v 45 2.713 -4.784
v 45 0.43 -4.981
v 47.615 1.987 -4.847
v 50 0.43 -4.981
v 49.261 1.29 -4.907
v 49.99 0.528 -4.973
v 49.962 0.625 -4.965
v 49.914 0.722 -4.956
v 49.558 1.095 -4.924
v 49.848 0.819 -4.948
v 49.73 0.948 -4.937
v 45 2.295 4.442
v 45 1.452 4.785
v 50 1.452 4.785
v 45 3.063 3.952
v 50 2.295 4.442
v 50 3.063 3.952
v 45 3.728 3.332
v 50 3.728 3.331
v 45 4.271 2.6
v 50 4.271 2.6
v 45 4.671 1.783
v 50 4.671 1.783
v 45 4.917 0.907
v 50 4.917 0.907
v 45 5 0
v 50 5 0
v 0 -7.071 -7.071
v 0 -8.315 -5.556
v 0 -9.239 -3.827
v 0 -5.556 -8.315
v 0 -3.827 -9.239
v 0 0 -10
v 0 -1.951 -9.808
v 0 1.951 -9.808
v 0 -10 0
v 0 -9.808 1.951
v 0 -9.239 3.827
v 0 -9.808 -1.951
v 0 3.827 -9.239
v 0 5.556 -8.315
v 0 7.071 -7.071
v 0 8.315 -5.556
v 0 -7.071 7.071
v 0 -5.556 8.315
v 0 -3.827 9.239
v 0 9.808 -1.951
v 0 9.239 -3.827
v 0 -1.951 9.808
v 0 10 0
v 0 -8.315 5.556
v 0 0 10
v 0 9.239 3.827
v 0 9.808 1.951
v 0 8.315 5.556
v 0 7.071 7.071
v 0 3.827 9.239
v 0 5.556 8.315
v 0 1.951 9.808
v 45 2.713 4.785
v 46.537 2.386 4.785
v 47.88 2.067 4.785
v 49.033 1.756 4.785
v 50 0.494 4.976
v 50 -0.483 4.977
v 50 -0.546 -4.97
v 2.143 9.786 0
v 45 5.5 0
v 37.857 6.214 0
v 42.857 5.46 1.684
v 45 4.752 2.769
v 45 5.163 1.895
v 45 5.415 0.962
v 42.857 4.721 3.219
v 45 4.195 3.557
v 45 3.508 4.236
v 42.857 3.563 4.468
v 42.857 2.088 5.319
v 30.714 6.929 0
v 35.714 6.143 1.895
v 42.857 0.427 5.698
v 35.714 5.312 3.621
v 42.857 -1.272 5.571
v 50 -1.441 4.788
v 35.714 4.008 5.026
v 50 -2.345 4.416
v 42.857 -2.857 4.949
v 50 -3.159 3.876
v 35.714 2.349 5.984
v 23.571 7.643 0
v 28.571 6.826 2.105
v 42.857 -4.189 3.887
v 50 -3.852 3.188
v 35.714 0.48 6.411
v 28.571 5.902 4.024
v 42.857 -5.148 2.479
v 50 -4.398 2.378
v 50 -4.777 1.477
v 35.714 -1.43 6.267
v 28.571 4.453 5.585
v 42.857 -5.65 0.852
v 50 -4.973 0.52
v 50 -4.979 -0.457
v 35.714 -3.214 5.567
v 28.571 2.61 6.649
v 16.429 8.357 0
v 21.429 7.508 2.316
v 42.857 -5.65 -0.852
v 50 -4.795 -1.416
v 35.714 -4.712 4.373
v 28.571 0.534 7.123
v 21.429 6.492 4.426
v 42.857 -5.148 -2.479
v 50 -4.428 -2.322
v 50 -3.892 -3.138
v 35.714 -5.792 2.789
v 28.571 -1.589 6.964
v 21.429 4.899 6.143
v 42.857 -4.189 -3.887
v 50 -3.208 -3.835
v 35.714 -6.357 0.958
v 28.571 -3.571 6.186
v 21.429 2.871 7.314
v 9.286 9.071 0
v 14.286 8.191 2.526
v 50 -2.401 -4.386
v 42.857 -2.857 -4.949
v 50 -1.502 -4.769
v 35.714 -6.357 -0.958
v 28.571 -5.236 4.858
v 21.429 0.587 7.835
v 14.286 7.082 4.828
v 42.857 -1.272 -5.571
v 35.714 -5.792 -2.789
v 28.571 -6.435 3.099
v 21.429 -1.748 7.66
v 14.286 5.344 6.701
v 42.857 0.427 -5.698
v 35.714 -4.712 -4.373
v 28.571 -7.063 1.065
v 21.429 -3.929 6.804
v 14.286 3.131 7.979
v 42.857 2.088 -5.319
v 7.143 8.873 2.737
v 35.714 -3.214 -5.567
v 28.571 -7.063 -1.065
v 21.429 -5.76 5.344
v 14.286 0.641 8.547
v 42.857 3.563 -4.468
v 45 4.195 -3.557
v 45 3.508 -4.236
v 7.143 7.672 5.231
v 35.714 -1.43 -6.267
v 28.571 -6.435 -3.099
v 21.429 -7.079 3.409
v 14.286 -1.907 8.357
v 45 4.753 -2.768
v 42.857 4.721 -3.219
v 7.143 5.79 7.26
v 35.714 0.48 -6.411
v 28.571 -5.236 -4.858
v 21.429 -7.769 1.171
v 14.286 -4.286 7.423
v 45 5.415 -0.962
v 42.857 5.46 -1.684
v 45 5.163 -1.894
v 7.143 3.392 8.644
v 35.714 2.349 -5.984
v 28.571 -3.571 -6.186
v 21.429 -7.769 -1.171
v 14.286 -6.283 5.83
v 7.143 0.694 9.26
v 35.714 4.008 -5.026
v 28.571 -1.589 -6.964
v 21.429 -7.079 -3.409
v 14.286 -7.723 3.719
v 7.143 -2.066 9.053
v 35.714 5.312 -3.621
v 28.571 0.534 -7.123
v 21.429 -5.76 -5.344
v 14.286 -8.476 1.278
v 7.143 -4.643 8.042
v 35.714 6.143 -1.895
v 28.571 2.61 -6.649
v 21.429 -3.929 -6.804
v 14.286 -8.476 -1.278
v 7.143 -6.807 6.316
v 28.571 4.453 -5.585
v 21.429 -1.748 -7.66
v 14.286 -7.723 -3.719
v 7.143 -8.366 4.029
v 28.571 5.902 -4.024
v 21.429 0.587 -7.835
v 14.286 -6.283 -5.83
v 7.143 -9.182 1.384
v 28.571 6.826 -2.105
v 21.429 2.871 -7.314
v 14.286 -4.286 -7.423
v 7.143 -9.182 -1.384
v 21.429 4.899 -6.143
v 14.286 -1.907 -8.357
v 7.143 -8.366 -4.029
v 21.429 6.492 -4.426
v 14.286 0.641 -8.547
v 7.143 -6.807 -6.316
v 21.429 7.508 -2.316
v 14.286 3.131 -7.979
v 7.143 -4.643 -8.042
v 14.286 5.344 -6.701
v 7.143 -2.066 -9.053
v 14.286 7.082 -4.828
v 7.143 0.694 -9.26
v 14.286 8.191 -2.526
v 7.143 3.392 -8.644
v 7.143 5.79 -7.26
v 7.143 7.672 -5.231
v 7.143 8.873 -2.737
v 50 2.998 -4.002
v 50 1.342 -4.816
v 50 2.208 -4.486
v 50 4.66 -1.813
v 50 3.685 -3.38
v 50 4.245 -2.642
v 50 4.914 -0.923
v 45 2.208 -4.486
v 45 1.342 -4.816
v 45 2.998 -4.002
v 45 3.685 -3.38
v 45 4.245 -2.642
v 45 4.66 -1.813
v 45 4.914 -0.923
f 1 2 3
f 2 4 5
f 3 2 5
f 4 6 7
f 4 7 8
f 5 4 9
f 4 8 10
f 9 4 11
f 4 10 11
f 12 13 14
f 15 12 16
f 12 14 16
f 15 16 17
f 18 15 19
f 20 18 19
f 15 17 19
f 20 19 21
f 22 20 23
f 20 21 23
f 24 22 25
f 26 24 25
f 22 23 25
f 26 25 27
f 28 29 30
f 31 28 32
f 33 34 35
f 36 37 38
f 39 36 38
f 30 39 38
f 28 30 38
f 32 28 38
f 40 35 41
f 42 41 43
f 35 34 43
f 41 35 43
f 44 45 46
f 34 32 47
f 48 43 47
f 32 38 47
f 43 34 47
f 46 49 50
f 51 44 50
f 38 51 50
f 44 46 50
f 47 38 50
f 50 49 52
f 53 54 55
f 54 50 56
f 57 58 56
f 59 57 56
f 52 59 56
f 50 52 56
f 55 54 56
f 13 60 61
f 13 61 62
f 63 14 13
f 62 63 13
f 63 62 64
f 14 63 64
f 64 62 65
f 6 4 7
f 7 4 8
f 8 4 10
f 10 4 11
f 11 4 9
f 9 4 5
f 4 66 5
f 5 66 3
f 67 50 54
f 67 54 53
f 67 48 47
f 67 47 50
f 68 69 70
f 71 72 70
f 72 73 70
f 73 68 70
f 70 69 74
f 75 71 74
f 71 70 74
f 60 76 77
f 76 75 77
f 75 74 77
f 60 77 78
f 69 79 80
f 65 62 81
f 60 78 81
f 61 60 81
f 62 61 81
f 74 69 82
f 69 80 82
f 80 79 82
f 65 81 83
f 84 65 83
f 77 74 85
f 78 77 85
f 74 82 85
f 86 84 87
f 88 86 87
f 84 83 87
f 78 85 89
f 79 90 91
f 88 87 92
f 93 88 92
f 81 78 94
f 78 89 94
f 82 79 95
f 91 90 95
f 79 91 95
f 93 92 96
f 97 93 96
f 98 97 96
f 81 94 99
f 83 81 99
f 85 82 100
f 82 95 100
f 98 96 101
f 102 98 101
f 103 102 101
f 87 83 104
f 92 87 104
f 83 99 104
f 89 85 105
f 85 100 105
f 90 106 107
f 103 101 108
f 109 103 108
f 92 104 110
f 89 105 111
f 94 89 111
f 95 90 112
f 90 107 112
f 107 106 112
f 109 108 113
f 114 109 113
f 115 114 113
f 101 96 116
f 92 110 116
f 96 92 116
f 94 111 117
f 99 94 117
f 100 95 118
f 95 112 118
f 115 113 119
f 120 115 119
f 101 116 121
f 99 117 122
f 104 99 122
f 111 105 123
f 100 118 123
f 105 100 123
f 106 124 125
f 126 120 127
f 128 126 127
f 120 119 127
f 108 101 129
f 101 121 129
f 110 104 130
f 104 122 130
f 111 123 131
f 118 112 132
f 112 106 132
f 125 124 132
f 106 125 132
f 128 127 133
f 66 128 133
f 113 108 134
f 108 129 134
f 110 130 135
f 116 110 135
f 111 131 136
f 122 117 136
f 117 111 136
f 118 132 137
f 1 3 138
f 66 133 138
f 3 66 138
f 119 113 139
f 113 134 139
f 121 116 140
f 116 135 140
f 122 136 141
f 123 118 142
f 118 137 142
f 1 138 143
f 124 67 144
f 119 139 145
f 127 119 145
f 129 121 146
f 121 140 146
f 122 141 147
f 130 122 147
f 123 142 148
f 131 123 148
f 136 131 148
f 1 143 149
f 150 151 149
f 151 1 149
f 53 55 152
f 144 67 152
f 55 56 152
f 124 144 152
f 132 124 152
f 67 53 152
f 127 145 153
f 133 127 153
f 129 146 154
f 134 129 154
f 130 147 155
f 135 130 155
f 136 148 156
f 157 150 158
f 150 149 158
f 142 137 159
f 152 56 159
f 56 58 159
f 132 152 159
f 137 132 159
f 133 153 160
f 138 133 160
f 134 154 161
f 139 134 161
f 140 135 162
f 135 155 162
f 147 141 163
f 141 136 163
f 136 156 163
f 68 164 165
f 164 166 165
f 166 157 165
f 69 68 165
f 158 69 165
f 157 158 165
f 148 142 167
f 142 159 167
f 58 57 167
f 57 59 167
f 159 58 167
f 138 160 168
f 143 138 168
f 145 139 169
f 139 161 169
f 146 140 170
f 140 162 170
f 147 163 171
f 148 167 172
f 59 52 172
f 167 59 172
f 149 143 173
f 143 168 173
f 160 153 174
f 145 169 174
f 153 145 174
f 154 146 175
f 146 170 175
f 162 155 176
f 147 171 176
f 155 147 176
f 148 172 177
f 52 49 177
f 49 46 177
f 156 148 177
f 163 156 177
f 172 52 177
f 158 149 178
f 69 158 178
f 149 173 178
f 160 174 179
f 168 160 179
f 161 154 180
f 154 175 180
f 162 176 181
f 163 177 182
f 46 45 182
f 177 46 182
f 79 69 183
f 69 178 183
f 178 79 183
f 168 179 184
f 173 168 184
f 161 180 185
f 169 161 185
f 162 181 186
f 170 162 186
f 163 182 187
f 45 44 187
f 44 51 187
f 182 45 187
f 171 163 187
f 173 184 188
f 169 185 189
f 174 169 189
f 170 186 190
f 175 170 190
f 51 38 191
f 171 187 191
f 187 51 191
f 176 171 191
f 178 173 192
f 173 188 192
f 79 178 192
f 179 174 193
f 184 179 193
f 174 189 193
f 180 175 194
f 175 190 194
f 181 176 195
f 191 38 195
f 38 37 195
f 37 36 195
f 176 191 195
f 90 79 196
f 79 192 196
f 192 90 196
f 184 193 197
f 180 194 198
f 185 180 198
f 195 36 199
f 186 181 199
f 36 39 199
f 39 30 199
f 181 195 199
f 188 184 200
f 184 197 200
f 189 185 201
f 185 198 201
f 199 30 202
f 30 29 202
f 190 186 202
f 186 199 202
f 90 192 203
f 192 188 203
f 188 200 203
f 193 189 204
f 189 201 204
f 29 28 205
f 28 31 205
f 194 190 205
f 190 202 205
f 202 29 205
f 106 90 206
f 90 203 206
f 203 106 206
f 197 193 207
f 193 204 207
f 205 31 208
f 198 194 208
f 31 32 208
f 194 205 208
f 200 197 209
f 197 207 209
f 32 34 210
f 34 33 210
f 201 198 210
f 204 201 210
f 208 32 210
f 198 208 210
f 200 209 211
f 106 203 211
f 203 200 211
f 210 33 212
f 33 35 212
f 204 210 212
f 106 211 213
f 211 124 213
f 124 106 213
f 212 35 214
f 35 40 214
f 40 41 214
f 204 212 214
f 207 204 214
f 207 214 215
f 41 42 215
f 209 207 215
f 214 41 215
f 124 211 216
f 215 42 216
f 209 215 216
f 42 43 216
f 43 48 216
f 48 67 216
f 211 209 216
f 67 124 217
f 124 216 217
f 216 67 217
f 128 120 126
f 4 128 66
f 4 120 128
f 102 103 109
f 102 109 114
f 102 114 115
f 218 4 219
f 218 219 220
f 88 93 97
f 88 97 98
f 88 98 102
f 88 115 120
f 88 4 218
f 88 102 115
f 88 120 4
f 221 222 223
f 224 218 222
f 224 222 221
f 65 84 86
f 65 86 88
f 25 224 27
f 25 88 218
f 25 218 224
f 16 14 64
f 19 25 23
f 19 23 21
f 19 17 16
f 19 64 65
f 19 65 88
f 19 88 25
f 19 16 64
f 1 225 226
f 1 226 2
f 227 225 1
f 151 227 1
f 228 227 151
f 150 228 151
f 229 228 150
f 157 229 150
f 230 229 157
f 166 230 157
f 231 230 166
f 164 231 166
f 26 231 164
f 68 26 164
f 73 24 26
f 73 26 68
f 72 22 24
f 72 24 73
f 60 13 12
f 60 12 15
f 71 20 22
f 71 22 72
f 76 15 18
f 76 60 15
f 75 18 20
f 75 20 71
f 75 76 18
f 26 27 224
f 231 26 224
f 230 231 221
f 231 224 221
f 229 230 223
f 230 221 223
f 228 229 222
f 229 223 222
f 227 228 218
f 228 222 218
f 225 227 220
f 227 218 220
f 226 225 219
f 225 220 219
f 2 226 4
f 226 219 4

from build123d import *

# Parameters (mm, degrees)
F1_R     = 5
F2_R     = 10
F5_DEPTH = 5


with BuildPart() as f3:
    # F1 (on offset) → F3 section 0
    with BuildSketch(Plane.YZ.offset(50)):
        Circle(F1_R)
    # F2 (on Right) → F3 section 1
    with BuildSketch(Plane.YZ):
        Circle(F2_R)
    loft()

    # F4 (on face) → F5 (cut)
    with BuildSketch(Plane.YZ.offset(50)):
        with BuildLine():
            Line((5.64992, 4.784543), (1.451947, 4.784543))
            ThreePointArc((1.451947, 4.784543), (4.016201, 2.978277), (5, 0))
            ThreePointArc((5, 0), (3.684566, -3.379937), (0.430411, -4.98144))
            Line((0.430411, -4.98144), (5.64992, -4.530459))
            Line((5.64992, -4.530459), (5.64992, 3.919373))
            Line((5.64992, 3.919373), (5.64992, 4.784543))
        make_face()
    extrude(amount=-F5_DEPTH, mode=Mode.SUBTRACT)


solid = f3.part
